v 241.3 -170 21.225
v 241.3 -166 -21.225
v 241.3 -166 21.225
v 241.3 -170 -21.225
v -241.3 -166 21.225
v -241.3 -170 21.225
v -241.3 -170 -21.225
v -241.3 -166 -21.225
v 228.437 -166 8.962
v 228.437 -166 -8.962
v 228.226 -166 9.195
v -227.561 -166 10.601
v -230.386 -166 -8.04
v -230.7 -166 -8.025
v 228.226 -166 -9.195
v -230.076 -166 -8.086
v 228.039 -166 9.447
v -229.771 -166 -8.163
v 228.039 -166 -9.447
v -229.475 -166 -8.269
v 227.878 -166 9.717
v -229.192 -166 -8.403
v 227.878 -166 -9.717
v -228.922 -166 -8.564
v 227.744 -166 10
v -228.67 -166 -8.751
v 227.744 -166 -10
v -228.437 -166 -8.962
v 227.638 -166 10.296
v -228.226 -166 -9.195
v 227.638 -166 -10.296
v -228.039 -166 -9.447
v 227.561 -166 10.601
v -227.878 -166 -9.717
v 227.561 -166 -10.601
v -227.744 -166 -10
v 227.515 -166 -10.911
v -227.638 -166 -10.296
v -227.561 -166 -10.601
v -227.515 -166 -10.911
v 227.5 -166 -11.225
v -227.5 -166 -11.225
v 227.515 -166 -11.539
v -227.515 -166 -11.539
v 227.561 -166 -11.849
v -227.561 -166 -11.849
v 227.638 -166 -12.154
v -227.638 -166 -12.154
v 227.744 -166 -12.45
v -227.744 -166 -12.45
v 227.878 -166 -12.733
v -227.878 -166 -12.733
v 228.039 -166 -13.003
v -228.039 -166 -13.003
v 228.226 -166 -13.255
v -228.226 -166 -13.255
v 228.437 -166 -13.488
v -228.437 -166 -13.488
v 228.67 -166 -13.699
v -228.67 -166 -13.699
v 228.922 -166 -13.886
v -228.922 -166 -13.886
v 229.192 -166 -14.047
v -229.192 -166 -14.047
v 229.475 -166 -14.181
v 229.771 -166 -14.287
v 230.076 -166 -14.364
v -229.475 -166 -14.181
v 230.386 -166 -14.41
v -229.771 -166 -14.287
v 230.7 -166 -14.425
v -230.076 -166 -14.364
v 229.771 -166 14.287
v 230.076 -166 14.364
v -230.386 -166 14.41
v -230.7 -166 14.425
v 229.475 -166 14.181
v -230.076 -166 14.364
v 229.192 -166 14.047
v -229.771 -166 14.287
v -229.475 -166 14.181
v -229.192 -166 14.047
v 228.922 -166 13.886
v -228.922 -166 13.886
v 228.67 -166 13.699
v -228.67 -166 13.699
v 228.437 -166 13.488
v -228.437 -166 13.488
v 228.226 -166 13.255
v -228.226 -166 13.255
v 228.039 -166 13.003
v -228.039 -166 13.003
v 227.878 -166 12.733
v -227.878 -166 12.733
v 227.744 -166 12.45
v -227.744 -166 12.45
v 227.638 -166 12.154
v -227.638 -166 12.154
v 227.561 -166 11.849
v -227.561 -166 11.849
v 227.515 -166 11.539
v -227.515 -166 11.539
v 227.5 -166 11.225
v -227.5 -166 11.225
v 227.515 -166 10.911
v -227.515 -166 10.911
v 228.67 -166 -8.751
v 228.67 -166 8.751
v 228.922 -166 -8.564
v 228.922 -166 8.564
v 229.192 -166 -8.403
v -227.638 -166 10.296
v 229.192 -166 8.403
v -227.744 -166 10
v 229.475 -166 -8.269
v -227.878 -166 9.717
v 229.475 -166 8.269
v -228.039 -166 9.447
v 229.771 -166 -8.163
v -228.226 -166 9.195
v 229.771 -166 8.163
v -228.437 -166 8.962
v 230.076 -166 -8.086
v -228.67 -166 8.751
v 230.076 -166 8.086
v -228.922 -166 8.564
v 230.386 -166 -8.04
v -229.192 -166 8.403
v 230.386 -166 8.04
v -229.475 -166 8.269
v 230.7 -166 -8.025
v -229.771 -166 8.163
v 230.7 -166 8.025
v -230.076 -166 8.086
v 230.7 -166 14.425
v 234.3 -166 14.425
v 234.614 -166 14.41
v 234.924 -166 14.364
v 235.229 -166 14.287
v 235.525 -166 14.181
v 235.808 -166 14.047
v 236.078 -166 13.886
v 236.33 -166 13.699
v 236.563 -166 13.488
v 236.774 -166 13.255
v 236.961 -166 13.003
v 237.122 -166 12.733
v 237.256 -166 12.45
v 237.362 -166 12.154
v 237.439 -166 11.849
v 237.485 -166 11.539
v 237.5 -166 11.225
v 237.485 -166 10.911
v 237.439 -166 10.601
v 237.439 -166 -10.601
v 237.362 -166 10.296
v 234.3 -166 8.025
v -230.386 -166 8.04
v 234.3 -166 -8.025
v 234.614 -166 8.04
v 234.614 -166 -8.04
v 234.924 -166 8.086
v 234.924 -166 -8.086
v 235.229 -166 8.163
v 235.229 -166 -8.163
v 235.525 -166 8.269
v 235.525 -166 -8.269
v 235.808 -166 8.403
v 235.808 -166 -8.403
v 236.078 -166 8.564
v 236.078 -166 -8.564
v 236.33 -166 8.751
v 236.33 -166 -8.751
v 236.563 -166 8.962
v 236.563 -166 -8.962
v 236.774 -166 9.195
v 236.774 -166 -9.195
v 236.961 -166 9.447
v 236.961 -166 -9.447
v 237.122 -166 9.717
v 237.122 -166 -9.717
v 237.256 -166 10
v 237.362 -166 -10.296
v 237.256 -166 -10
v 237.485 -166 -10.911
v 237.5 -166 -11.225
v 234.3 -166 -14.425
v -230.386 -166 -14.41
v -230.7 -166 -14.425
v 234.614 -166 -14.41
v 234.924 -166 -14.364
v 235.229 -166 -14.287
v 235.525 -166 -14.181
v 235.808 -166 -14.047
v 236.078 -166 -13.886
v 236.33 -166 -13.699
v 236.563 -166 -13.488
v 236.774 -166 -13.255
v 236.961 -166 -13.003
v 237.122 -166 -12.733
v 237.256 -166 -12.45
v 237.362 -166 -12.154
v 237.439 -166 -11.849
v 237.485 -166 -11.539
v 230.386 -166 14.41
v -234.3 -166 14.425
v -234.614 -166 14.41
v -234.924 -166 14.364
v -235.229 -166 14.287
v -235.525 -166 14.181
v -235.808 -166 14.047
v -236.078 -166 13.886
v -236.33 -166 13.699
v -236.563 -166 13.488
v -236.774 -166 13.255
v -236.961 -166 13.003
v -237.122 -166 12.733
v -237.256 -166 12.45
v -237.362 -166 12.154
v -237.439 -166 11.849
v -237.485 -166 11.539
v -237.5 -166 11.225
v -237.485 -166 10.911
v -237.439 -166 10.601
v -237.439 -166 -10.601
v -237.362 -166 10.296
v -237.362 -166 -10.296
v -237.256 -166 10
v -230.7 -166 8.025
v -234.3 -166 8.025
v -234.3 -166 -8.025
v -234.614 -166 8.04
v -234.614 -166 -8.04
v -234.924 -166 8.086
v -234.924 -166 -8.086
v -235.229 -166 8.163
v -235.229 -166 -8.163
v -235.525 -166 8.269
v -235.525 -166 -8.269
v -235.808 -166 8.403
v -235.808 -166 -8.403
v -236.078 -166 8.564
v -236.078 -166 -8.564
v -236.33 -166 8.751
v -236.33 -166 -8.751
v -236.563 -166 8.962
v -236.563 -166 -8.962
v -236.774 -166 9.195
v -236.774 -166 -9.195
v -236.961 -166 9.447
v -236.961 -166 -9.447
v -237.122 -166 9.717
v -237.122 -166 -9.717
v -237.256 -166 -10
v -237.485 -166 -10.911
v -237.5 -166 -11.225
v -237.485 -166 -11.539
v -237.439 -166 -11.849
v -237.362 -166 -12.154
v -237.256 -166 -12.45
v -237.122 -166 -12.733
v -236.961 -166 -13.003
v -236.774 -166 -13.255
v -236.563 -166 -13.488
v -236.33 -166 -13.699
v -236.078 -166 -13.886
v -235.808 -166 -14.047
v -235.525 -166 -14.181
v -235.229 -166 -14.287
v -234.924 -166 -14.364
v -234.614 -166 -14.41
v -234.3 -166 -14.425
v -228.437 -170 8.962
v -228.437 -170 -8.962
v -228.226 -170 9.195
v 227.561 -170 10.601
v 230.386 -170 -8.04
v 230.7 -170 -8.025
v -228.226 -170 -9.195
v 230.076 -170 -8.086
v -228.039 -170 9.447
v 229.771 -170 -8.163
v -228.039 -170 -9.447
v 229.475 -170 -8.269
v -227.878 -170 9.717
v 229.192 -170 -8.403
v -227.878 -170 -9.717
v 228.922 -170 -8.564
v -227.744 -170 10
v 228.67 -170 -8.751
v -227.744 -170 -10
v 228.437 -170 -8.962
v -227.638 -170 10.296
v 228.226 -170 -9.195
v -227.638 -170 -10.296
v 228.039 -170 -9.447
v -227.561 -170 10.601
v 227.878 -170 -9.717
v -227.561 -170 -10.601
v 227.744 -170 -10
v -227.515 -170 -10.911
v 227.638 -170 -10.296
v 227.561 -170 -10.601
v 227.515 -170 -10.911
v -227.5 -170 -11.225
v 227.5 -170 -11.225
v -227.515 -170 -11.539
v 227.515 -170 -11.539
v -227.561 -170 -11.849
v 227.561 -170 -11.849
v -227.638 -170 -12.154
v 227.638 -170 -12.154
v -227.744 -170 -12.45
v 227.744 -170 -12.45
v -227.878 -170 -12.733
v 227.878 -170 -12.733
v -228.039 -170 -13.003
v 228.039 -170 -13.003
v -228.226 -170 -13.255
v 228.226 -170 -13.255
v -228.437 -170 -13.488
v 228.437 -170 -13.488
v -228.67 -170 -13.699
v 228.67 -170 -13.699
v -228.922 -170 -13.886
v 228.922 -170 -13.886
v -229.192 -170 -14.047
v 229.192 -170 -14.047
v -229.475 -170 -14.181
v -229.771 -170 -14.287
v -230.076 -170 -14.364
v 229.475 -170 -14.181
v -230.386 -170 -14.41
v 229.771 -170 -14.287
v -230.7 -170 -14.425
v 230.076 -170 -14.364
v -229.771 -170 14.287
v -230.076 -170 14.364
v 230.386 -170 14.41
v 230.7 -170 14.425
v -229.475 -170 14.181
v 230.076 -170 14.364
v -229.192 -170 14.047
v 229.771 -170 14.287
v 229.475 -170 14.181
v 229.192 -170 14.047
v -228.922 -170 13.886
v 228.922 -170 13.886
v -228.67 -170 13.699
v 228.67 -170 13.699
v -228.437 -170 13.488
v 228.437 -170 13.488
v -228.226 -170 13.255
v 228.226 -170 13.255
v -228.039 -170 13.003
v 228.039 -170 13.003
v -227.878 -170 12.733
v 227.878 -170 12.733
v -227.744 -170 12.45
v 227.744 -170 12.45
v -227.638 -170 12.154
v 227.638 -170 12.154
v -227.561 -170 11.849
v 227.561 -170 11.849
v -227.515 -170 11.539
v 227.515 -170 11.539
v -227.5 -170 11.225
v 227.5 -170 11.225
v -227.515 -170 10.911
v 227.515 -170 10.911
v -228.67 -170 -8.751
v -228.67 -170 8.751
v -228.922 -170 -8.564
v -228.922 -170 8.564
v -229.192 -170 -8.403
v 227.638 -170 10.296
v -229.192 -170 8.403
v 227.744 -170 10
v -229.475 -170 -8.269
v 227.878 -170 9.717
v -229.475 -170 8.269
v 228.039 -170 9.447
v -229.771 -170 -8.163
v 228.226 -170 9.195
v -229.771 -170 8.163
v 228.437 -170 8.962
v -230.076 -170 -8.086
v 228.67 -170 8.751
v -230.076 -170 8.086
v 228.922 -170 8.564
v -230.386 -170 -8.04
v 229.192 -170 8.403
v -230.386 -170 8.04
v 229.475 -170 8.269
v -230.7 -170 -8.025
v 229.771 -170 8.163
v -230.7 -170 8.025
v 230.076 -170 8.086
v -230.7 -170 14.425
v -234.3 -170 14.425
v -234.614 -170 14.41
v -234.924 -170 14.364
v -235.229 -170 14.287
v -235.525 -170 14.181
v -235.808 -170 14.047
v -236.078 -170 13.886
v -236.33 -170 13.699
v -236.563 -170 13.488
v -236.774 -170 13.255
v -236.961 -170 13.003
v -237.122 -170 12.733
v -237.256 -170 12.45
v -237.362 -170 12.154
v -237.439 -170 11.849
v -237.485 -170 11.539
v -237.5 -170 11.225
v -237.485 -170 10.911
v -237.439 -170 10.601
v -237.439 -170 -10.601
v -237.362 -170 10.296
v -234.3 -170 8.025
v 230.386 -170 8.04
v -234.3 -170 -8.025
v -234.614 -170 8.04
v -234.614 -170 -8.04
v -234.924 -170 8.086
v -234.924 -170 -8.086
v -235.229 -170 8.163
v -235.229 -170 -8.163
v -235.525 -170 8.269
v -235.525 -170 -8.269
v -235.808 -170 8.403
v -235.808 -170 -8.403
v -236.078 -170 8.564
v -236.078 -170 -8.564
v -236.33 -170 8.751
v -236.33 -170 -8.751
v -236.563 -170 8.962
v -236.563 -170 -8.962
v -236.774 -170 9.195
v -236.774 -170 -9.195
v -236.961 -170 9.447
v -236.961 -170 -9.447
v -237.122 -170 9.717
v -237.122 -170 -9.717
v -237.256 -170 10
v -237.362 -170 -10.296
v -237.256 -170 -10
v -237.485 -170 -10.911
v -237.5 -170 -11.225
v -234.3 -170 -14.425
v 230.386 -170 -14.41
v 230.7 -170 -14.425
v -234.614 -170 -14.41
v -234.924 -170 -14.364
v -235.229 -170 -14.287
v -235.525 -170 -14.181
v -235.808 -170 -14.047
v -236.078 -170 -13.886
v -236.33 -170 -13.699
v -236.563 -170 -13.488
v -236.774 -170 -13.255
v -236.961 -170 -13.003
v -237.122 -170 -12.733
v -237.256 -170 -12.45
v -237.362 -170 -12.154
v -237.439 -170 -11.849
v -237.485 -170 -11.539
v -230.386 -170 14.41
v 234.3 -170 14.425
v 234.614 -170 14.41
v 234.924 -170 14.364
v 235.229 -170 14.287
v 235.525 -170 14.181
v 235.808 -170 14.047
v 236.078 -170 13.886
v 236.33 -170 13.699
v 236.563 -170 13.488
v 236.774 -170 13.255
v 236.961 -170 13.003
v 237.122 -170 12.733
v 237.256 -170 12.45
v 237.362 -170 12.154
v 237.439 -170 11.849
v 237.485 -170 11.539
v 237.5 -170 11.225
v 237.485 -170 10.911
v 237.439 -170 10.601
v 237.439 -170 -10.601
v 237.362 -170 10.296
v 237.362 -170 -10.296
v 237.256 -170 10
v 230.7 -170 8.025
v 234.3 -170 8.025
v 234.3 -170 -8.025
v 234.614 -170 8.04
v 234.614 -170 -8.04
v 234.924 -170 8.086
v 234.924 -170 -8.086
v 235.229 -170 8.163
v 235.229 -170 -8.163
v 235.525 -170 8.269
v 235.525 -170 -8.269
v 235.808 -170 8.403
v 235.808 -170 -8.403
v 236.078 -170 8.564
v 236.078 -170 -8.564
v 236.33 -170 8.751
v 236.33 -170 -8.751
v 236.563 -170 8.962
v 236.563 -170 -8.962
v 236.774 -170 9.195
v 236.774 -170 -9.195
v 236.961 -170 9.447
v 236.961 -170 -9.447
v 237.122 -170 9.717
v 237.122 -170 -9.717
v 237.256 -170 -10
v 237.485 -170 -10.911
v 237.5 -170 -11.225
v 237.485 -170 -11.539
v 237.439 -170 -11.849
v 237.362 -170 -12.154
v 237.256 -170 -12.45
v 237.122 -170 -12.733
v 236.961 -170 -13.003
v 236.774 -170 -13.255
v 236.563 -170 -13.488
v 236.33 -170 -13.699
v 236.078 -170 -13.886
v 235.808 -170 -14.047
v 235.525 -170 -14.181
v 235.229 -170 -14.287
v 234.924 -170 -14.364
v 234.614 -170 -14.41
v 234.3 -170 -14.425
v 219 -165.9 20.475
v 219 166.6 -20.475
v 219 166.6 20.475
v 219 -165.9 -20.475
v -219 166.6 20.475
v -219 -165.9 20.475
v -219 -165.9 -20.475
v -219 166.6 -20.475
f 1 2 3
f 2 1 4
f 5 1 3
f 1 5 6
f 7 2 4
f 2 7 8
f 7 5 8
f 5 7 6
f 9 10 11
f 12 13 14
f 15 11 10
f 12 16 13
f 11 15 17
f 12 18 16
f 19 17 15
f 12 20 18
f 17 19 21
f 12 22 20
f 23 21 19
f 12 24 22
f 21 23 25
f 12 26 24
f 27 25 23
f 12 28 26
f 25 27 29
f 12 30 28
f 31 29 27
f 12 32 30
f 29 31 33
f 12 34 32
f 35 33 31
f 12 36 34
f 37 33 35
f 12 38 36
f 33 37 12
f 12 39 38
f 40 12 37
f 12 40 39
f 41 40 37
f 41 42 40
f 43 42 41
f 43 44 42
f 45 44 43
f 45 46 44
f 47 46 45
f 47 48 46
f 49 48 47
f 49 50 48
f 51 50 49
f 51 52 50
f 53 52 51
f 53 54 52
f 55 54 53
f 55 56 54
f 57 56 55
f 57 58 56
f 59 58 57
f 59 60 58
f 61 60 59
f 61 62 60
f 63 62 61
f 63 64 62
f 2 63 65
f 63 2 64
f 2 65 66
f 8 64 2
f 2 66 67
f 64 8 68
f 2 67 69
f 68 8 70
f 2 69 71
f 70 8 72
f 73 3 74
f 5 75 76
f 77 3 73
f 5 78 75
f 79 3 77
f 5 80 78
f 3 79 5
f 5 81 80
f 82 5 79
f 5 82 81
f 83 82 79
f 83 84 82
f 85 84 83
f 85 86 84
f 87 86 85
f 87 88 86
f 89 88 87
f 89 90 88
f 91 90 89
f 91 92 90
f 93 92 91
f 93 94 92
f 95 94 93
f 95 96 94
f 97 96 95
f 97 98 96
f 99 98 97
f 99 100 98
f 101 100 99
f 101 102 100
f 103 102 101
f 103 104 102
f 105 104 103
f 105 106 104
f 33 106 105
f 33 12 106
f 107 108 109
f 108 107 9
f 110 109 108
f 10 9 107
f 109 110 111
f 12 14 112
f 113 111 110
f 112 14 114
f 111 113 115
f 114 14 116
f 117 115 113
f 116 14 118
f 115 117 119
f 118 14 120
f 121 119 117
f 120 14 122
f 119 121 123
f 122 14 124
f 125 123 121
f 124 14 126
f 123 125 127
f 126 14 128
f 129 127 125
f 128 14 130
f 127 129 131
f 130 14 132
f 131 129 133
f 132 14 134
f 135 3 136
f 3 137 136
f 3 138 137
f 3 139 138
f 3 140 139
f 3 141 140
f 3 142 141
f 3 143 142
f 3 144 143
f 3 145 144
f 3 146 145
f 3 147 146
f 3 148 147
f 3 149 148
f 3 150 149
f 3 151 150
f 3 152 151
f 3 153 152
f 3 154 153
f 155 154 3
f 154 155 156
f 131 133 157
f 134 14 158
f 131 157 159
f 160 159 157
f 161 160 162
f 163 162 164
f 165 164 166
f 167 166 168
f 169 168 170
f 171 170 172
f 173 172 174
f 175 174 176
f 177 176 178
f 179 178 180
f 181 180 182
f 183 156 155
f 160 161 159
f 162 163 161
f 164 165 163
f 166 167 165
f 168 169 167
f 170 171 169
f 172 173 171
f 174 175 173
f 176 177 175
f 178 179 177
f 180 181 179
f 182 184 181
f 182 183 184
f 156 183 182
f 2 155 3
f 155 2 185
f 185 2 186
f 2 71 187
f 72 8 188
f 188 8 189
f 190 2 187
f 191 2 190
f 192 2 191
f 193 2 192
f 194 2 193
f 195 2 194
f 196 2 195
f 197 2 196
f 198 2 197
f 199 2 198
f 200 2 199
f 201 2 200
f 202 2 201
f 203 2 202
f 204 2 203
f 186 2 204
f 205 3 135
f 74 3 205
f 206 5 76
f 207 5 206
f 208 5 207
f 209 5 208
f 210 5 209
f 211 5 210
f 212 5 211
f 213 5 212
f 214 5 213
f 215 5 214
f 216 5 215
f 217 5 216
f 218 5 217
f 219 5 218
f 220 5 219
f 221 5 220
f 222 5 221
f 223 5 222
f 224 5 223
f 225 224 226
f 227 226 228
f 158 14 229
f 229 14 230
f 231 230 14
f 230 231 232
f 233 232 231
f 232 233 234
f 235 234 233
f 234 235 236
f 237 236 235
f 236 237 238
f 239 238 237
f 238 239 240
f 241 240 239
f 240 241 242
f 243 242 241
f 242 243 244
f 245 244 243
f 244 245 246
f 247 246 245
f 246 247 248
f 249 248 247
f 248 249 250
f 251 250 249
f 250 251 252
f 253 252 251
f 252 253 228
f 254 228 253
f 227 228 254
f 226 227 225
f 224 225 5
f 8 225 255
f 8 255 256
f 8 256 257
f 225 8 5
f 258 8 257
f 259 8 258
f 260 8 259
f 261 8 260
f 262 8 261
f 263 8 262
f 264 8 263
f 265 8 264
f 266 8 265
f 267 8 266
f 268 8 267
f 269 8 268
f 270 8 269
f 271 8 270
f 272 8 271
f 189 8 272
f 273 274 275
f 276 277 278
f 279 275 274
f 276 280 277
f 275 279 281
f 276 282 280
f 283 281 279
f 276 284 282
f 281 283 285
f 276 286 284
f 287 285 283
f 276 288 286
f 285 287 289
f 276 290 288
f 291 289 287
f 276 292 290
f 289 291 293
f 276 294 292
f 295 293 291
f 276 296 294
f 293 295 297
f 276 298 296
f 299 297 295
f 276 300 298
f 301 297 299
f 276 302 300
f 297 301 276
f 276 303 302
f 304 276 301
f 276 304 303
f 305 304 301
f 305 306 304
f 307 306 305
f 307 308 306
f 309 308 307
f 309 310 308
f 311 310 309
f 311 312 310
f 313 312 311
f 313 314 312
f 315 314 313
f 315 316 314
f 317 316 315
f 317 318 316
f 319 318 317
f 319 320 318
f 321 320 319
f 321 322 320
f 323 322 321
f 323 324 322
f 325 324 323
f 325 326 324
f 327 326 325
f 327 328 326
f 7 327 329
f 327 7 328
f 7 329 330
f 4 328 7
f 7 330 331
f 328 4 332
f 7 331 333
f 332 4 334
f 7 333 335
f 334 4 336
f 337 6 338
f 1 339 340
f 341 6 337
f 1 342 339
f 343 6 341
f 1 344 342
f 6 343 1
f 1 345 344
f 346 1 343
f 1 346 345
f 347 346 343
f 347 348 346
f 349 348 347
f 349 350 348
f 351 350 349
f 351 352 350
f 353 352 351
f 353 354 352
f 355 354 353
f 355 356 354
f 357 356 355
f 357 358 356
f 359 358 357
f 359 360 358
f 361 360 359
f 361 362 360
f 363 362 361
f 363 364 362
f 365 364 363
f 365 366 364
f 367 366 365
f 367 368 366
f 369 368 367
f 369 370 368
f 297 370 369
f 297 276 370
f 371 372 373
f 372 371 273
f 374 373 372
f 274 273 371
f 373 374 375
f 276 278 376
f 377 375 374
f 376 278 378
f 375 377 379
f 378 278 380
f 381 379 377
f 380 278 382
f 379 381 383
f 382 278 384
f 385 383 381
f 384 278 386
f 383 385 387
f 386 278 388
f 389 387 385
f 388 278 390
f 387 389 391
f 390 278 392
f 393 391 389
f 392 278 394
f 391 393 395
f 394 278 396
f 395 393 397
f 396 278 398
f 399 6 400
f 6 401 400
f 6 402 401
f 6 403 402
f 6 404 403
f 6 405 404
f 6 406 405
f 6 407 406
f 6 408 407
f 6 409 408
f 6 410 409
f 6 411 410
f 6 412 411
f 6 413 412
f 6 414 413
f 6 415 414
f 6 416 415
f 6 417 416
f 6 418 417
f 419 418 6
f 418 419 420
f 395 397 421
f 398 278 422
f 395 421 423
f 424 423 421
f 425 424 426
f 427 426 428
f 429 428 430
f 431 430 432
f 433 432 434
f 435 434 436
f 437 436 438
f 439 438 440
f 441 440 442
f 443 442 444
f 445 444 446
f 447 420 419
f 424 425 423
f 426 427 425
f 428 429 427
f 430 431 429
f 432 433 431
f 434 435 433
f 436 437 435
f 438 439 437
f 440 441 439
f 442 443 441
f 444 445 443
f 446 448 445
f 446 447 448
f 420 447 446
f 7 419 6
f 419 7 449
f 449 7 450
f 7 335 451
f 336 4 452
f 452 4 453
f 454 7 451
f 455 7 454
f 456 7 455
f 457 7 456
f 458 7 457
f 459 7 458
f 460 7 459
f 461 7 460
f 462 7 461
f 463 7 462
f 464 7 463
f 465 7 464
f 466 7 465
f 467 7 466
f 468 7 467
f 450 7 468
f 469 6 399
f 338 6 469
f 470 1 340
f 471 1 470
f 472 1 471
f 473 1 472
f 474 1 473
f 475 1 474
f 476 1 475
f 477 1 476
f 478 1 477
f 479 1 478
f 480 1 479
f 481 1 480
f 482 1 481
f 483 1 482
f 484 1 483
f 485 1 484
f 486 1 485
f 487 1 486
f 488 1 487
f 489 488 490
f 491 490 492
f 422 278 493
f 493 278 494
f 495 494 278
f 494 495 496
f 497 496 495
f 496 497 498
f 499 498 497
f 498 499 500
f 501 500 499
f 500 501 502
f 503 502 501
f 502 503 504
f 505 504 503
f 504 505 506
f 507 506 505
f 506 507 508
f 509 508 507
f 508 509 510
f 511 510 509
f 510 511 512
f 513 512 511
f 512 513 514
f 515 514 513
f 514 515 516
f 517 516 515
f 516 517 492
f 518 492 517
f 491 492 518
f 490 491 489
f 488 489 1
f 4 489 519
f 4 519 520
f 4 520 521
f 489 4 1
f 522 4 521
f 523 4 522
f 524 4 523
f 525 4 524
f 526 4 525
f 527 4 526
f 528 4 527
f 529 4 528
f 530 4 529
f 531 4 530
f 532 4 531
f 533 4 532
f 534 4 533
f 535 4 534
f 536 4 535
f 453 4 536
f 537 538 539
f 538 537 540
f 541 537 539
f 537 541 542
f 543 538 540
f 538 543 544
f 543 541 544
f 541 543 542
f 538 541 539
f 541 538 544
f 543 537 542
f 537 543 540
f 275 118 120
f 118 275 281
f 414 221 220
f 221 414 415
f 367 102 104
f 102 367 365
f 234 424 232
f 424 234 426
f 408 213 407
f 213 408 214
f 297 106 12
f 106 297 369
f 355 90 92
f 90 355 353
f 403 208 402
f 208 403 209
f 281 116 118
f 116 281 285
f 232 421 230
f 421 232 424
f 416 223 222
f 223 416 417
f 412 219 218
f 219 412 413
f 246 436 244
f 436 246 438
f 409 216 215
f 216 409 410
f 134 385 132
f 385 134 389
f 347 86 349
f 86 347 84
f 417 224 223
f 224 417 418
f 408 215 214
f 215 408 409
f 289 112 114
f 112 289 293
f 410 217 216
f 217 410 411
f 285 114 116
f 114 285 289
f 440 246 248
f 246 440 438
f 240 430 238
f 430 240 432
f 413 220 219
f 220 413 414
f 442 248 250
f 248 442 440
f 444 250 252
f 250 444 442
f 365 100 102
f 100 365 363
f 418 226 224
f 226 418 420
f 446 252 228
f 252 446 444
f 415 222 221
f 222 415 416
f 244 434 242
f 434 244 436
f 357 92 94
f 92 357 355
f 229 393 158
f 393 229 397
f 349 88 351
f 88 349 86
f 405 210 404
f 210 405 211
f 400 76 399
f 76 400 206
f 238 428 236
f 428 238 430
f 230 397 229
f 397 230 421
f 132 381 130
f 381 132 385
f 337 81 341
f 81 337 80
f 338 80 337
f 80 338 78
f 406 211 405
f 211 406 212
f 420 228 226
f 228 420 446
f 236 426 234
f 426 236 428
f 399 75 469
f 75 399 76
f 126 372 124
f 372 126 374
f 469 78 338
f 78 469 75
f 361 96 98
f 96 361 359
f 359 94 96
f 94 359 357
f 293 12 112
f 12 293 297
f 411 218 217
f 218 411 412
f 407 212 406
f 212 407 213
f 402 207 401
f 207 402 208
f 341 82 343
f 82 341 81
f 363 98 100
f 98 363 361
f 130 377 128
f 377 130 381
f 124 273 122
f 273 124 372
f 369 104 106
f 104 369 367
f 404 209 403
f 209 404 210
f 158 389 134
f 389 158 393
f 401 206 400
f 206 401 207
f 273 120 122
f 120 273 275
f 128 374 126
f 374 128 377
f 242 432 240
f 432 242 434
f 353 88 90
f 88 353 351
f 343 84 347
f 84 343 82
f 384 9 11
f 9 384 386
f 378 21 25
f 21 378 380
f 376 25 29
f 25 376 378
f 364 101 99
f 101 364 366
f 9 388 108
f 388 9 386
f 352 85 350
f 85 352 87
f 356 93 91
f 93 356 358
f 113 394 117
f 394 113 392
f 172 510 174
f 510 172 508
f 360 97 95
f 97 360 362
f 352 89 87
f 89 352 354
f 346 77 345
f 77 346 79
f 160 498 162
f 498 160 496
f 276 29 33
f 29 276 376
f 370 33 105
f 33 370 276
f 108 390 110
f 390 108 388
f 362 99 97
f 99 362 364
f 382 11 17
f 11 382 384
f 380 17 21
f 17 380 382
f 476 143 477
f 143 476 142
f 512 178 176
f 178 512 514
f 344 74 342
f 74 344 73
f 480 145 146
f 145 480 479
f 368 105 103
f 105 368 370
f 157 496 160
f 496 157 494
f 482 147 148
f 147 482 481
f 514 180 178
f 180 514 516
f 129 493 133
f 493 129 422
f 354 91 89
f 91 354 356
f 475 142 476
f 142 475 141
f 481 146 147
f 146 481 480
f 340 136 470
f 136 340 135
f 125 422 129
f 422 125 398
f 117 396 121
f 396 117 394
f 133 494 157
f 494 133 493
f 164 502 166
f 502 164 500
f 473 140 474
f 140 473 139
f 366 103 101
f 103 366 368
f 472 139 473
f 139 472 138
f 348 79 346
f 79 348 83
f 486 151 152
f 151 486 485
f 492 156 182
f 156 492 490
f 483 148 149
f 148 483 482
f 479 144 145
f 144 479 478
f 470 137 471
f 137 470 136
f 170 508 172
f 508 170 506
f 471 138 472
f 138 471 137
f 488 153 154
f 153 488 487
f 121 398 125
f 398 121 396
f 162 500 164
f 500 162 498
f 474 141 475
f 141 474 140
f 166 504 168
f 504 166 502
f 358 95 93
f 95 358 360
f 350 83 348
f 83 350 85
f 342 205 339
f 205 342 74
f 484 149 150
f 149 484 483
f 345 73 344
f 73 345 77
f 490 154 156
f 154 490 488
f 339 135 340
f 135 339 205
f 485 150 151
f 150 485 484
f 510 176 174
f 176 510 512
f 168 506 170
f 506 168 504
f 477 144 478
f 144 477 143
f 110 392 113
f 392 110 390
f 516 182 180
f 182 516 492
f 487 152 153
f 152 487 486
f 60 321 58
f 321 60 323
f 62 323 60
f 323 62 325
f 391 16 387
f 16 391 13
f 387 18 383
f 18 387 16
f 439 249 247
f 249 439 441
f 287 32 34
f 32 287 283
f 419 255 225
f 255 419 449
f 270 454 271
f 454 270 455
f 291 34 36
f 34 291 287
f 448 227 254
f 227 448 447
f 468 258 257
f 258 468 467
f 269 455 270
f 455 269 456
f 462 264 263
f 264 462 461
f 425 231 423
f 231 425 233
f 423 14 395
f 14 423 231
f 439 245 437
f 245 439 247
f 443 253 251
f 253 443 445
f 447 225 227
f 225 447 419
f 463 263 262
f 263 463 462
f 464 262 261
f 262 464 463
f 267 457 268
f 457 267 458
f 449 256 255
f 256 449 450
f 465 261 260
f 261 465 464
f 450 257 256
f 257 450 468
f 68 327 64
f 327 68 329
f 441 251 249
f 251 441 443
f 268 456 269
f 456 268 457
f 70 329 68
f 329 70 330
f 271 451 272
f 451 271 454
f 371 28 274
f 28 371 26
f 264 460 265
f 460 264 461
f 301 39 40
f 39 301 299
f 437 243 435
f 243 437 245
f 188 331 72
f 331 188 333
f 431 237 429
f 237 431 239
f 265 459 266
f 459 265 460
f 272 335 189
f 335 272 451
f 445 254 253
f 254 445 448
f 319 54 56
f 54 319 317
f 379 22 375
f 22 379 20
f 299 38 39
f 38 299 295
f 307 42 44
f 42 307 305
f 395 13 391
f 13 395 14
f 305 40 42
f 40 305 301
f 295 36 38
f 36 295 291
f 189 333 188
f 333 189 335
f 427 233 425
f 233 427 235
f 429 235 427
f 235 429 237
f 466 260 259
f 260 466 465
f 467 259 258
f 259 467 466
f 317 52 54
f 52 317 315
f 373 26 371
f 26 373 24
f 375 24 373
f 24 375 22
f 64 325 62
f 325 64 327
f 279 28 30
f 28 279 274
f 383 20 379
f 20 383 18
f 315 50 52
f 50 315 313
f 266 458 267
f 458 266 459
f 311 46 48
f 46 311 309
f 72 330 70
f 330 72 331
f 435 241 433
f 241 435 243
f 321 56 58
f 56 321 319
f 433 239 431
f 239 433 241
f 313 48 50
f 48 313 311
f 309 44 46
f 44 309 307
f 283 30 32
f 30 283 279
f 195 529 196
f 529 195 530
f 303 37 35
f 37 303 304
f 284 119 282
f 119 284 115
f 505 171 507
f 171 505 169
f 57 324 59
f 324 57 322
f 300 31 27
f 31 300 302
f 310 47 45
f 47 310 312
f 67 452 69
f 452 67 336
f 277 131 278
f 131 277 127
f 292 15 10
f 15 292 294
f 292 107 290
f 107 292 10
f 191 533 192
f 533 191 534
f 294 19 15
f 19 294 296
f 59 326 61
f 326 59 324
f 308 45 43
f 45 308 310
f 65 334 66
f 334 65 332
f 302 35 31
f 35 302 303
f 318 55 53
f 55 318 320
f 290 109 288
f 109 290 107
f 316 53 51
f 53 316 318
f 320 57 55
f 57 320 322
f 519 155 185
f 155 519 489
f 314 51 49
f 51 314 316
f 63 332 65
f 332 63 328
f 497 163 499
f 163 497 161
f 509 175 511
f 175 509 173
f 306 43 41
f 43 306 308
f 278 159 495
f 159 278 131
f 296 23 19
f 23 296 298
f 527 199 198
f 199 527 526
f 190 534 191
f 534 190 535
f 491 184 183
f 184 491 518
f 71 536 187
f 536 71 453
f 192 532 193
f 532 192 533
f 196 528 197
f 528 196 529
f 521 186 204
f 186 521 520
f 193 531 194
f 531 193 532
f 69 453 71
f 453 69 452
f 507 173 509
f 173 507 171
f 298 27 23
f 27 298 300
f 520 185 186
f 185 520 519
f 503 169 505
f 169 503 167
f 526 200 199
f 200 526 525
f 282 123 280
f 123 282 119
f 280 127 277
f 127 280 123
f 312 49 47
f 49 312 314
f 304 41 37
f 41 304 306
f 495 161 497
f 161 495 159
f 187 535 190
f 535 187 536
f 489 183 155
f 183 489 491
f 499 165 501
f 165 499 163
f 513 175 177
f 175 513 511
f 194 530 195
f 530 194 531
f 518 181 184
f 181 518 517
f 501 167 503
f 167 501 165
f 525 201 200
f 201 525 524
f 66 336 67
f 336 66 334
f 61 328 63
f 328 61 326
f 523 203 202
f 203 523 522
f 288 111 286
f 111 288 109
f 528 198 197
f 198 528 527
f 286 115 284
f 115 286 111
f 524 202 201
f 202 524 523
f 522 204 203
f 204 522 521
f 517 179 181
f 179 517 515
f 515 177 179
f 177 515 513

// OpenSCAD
// ============================================================================
// Atom Lithography Machine — Parametric OpenSCAD Module (S4.5-03)
// ============================================================================
// part_id           : S4.5-03
// parent_bom_id     : S4.5
// subsystem         : S4
// part_name         : Atis-ani sapma telafi arayuzu (interferometre -> demet saptirici DSP)
// material          : Al 6061
// temp_stage        : 300 K (kabin)
// vacuum_grade      : Atmosfer
// tolerance         : ±0.1 nm
// computed_mass_kg  : 2.93539
// envelope_mm       : 482.600 x 373.000 x 42.450
// design_maturity   : M0_M1_DETAILED_CAD_DESIGN_ONLY
// no_lab_measurement: true
// iec61508_certified: false
// semi_s2_certified : false
// Units: millimeters (mm)
// ============================================================================

$fn = 64;

// Nominal bounding envelope parameters (mm)
bbox_x = 482.6000;
bbox_y = 373.0000;
bbox_z = 42.4500;

// Part-specific parametric dimensions
rack_u_height = 1;
depth_mm = 340.0;
max_latency_us = 5.0;

// Interface / port parameters (mm)

module part_S4_5_03() {
  difference() {
    union() {
      // 19-inch EIA-310 1U front bezel (facing -Y)
      translate([0.000, -168.000, 0.000]) cube([482.600, 4.000, 42.450], center=true);
      // Hollow EMI rack body
      translate([0.000, 0.350, 0.000]) cube([438.000, 332.500, 40.950], center=true);
    }
    // EIA-310 upper-left ear slot
    translate([-232.500, -168.000, 11.225]) rotate([90.000, 0.000, 0.000]) {
      hull() {
        translate([-1.800, 0, 0]) cylinder(d=6.400, h=8.000, center=true);
        translate([1.800, 0, 0]) cylinder(d=6.400, h=8.000, center=true);
      }
    }
    // EIA-310 upper-right ear slot
    translate([232.500, -168.000, 11.225]) rotate([90.000, 0.000, 0.000]) {
      hull() {
        translate([-1.800, 0, 0]) cylinder(d=6.400, h=8.000, center=true);
        translate([1.800, 0, 0]) cylinder(d=6.400, h=8.000, center=true);
      }
    }
    // EIA-310 lower-left ear slot
    translate([-232.500, -168.000, -11.225]) rotate([90.000, 0.000, 0.000]) {
      hull() {
        translate([-1.800, 0, 0]) cylinder(d=6.400, h=8.000, center=true);
        translate([1.800, 0, 0]) cylinder(d=6.400, h=8.000, center=true);
      }
    }
    // EIA-310 lower-right ear slot
    translate([232.500, -168.000, -11.225]) rotate([90.000, 0.000, 0.000]) {
      hull() {
        translate([-1.800, 0, 0]) cylinder(d=6.400, h=8.000, center=true);
        translate([1.800, 0, 0]) cylinder(d=6.400, h=8.000, center=true);
      }
    }
  }
}

// World assembly mounting transform (global machine frame, mm / deg):
// translate([1480.000, -240.000, 323.425]) rotate([0.000, 0.000, 0.000]) part_S4_5_03();

part_S4_5_03();
